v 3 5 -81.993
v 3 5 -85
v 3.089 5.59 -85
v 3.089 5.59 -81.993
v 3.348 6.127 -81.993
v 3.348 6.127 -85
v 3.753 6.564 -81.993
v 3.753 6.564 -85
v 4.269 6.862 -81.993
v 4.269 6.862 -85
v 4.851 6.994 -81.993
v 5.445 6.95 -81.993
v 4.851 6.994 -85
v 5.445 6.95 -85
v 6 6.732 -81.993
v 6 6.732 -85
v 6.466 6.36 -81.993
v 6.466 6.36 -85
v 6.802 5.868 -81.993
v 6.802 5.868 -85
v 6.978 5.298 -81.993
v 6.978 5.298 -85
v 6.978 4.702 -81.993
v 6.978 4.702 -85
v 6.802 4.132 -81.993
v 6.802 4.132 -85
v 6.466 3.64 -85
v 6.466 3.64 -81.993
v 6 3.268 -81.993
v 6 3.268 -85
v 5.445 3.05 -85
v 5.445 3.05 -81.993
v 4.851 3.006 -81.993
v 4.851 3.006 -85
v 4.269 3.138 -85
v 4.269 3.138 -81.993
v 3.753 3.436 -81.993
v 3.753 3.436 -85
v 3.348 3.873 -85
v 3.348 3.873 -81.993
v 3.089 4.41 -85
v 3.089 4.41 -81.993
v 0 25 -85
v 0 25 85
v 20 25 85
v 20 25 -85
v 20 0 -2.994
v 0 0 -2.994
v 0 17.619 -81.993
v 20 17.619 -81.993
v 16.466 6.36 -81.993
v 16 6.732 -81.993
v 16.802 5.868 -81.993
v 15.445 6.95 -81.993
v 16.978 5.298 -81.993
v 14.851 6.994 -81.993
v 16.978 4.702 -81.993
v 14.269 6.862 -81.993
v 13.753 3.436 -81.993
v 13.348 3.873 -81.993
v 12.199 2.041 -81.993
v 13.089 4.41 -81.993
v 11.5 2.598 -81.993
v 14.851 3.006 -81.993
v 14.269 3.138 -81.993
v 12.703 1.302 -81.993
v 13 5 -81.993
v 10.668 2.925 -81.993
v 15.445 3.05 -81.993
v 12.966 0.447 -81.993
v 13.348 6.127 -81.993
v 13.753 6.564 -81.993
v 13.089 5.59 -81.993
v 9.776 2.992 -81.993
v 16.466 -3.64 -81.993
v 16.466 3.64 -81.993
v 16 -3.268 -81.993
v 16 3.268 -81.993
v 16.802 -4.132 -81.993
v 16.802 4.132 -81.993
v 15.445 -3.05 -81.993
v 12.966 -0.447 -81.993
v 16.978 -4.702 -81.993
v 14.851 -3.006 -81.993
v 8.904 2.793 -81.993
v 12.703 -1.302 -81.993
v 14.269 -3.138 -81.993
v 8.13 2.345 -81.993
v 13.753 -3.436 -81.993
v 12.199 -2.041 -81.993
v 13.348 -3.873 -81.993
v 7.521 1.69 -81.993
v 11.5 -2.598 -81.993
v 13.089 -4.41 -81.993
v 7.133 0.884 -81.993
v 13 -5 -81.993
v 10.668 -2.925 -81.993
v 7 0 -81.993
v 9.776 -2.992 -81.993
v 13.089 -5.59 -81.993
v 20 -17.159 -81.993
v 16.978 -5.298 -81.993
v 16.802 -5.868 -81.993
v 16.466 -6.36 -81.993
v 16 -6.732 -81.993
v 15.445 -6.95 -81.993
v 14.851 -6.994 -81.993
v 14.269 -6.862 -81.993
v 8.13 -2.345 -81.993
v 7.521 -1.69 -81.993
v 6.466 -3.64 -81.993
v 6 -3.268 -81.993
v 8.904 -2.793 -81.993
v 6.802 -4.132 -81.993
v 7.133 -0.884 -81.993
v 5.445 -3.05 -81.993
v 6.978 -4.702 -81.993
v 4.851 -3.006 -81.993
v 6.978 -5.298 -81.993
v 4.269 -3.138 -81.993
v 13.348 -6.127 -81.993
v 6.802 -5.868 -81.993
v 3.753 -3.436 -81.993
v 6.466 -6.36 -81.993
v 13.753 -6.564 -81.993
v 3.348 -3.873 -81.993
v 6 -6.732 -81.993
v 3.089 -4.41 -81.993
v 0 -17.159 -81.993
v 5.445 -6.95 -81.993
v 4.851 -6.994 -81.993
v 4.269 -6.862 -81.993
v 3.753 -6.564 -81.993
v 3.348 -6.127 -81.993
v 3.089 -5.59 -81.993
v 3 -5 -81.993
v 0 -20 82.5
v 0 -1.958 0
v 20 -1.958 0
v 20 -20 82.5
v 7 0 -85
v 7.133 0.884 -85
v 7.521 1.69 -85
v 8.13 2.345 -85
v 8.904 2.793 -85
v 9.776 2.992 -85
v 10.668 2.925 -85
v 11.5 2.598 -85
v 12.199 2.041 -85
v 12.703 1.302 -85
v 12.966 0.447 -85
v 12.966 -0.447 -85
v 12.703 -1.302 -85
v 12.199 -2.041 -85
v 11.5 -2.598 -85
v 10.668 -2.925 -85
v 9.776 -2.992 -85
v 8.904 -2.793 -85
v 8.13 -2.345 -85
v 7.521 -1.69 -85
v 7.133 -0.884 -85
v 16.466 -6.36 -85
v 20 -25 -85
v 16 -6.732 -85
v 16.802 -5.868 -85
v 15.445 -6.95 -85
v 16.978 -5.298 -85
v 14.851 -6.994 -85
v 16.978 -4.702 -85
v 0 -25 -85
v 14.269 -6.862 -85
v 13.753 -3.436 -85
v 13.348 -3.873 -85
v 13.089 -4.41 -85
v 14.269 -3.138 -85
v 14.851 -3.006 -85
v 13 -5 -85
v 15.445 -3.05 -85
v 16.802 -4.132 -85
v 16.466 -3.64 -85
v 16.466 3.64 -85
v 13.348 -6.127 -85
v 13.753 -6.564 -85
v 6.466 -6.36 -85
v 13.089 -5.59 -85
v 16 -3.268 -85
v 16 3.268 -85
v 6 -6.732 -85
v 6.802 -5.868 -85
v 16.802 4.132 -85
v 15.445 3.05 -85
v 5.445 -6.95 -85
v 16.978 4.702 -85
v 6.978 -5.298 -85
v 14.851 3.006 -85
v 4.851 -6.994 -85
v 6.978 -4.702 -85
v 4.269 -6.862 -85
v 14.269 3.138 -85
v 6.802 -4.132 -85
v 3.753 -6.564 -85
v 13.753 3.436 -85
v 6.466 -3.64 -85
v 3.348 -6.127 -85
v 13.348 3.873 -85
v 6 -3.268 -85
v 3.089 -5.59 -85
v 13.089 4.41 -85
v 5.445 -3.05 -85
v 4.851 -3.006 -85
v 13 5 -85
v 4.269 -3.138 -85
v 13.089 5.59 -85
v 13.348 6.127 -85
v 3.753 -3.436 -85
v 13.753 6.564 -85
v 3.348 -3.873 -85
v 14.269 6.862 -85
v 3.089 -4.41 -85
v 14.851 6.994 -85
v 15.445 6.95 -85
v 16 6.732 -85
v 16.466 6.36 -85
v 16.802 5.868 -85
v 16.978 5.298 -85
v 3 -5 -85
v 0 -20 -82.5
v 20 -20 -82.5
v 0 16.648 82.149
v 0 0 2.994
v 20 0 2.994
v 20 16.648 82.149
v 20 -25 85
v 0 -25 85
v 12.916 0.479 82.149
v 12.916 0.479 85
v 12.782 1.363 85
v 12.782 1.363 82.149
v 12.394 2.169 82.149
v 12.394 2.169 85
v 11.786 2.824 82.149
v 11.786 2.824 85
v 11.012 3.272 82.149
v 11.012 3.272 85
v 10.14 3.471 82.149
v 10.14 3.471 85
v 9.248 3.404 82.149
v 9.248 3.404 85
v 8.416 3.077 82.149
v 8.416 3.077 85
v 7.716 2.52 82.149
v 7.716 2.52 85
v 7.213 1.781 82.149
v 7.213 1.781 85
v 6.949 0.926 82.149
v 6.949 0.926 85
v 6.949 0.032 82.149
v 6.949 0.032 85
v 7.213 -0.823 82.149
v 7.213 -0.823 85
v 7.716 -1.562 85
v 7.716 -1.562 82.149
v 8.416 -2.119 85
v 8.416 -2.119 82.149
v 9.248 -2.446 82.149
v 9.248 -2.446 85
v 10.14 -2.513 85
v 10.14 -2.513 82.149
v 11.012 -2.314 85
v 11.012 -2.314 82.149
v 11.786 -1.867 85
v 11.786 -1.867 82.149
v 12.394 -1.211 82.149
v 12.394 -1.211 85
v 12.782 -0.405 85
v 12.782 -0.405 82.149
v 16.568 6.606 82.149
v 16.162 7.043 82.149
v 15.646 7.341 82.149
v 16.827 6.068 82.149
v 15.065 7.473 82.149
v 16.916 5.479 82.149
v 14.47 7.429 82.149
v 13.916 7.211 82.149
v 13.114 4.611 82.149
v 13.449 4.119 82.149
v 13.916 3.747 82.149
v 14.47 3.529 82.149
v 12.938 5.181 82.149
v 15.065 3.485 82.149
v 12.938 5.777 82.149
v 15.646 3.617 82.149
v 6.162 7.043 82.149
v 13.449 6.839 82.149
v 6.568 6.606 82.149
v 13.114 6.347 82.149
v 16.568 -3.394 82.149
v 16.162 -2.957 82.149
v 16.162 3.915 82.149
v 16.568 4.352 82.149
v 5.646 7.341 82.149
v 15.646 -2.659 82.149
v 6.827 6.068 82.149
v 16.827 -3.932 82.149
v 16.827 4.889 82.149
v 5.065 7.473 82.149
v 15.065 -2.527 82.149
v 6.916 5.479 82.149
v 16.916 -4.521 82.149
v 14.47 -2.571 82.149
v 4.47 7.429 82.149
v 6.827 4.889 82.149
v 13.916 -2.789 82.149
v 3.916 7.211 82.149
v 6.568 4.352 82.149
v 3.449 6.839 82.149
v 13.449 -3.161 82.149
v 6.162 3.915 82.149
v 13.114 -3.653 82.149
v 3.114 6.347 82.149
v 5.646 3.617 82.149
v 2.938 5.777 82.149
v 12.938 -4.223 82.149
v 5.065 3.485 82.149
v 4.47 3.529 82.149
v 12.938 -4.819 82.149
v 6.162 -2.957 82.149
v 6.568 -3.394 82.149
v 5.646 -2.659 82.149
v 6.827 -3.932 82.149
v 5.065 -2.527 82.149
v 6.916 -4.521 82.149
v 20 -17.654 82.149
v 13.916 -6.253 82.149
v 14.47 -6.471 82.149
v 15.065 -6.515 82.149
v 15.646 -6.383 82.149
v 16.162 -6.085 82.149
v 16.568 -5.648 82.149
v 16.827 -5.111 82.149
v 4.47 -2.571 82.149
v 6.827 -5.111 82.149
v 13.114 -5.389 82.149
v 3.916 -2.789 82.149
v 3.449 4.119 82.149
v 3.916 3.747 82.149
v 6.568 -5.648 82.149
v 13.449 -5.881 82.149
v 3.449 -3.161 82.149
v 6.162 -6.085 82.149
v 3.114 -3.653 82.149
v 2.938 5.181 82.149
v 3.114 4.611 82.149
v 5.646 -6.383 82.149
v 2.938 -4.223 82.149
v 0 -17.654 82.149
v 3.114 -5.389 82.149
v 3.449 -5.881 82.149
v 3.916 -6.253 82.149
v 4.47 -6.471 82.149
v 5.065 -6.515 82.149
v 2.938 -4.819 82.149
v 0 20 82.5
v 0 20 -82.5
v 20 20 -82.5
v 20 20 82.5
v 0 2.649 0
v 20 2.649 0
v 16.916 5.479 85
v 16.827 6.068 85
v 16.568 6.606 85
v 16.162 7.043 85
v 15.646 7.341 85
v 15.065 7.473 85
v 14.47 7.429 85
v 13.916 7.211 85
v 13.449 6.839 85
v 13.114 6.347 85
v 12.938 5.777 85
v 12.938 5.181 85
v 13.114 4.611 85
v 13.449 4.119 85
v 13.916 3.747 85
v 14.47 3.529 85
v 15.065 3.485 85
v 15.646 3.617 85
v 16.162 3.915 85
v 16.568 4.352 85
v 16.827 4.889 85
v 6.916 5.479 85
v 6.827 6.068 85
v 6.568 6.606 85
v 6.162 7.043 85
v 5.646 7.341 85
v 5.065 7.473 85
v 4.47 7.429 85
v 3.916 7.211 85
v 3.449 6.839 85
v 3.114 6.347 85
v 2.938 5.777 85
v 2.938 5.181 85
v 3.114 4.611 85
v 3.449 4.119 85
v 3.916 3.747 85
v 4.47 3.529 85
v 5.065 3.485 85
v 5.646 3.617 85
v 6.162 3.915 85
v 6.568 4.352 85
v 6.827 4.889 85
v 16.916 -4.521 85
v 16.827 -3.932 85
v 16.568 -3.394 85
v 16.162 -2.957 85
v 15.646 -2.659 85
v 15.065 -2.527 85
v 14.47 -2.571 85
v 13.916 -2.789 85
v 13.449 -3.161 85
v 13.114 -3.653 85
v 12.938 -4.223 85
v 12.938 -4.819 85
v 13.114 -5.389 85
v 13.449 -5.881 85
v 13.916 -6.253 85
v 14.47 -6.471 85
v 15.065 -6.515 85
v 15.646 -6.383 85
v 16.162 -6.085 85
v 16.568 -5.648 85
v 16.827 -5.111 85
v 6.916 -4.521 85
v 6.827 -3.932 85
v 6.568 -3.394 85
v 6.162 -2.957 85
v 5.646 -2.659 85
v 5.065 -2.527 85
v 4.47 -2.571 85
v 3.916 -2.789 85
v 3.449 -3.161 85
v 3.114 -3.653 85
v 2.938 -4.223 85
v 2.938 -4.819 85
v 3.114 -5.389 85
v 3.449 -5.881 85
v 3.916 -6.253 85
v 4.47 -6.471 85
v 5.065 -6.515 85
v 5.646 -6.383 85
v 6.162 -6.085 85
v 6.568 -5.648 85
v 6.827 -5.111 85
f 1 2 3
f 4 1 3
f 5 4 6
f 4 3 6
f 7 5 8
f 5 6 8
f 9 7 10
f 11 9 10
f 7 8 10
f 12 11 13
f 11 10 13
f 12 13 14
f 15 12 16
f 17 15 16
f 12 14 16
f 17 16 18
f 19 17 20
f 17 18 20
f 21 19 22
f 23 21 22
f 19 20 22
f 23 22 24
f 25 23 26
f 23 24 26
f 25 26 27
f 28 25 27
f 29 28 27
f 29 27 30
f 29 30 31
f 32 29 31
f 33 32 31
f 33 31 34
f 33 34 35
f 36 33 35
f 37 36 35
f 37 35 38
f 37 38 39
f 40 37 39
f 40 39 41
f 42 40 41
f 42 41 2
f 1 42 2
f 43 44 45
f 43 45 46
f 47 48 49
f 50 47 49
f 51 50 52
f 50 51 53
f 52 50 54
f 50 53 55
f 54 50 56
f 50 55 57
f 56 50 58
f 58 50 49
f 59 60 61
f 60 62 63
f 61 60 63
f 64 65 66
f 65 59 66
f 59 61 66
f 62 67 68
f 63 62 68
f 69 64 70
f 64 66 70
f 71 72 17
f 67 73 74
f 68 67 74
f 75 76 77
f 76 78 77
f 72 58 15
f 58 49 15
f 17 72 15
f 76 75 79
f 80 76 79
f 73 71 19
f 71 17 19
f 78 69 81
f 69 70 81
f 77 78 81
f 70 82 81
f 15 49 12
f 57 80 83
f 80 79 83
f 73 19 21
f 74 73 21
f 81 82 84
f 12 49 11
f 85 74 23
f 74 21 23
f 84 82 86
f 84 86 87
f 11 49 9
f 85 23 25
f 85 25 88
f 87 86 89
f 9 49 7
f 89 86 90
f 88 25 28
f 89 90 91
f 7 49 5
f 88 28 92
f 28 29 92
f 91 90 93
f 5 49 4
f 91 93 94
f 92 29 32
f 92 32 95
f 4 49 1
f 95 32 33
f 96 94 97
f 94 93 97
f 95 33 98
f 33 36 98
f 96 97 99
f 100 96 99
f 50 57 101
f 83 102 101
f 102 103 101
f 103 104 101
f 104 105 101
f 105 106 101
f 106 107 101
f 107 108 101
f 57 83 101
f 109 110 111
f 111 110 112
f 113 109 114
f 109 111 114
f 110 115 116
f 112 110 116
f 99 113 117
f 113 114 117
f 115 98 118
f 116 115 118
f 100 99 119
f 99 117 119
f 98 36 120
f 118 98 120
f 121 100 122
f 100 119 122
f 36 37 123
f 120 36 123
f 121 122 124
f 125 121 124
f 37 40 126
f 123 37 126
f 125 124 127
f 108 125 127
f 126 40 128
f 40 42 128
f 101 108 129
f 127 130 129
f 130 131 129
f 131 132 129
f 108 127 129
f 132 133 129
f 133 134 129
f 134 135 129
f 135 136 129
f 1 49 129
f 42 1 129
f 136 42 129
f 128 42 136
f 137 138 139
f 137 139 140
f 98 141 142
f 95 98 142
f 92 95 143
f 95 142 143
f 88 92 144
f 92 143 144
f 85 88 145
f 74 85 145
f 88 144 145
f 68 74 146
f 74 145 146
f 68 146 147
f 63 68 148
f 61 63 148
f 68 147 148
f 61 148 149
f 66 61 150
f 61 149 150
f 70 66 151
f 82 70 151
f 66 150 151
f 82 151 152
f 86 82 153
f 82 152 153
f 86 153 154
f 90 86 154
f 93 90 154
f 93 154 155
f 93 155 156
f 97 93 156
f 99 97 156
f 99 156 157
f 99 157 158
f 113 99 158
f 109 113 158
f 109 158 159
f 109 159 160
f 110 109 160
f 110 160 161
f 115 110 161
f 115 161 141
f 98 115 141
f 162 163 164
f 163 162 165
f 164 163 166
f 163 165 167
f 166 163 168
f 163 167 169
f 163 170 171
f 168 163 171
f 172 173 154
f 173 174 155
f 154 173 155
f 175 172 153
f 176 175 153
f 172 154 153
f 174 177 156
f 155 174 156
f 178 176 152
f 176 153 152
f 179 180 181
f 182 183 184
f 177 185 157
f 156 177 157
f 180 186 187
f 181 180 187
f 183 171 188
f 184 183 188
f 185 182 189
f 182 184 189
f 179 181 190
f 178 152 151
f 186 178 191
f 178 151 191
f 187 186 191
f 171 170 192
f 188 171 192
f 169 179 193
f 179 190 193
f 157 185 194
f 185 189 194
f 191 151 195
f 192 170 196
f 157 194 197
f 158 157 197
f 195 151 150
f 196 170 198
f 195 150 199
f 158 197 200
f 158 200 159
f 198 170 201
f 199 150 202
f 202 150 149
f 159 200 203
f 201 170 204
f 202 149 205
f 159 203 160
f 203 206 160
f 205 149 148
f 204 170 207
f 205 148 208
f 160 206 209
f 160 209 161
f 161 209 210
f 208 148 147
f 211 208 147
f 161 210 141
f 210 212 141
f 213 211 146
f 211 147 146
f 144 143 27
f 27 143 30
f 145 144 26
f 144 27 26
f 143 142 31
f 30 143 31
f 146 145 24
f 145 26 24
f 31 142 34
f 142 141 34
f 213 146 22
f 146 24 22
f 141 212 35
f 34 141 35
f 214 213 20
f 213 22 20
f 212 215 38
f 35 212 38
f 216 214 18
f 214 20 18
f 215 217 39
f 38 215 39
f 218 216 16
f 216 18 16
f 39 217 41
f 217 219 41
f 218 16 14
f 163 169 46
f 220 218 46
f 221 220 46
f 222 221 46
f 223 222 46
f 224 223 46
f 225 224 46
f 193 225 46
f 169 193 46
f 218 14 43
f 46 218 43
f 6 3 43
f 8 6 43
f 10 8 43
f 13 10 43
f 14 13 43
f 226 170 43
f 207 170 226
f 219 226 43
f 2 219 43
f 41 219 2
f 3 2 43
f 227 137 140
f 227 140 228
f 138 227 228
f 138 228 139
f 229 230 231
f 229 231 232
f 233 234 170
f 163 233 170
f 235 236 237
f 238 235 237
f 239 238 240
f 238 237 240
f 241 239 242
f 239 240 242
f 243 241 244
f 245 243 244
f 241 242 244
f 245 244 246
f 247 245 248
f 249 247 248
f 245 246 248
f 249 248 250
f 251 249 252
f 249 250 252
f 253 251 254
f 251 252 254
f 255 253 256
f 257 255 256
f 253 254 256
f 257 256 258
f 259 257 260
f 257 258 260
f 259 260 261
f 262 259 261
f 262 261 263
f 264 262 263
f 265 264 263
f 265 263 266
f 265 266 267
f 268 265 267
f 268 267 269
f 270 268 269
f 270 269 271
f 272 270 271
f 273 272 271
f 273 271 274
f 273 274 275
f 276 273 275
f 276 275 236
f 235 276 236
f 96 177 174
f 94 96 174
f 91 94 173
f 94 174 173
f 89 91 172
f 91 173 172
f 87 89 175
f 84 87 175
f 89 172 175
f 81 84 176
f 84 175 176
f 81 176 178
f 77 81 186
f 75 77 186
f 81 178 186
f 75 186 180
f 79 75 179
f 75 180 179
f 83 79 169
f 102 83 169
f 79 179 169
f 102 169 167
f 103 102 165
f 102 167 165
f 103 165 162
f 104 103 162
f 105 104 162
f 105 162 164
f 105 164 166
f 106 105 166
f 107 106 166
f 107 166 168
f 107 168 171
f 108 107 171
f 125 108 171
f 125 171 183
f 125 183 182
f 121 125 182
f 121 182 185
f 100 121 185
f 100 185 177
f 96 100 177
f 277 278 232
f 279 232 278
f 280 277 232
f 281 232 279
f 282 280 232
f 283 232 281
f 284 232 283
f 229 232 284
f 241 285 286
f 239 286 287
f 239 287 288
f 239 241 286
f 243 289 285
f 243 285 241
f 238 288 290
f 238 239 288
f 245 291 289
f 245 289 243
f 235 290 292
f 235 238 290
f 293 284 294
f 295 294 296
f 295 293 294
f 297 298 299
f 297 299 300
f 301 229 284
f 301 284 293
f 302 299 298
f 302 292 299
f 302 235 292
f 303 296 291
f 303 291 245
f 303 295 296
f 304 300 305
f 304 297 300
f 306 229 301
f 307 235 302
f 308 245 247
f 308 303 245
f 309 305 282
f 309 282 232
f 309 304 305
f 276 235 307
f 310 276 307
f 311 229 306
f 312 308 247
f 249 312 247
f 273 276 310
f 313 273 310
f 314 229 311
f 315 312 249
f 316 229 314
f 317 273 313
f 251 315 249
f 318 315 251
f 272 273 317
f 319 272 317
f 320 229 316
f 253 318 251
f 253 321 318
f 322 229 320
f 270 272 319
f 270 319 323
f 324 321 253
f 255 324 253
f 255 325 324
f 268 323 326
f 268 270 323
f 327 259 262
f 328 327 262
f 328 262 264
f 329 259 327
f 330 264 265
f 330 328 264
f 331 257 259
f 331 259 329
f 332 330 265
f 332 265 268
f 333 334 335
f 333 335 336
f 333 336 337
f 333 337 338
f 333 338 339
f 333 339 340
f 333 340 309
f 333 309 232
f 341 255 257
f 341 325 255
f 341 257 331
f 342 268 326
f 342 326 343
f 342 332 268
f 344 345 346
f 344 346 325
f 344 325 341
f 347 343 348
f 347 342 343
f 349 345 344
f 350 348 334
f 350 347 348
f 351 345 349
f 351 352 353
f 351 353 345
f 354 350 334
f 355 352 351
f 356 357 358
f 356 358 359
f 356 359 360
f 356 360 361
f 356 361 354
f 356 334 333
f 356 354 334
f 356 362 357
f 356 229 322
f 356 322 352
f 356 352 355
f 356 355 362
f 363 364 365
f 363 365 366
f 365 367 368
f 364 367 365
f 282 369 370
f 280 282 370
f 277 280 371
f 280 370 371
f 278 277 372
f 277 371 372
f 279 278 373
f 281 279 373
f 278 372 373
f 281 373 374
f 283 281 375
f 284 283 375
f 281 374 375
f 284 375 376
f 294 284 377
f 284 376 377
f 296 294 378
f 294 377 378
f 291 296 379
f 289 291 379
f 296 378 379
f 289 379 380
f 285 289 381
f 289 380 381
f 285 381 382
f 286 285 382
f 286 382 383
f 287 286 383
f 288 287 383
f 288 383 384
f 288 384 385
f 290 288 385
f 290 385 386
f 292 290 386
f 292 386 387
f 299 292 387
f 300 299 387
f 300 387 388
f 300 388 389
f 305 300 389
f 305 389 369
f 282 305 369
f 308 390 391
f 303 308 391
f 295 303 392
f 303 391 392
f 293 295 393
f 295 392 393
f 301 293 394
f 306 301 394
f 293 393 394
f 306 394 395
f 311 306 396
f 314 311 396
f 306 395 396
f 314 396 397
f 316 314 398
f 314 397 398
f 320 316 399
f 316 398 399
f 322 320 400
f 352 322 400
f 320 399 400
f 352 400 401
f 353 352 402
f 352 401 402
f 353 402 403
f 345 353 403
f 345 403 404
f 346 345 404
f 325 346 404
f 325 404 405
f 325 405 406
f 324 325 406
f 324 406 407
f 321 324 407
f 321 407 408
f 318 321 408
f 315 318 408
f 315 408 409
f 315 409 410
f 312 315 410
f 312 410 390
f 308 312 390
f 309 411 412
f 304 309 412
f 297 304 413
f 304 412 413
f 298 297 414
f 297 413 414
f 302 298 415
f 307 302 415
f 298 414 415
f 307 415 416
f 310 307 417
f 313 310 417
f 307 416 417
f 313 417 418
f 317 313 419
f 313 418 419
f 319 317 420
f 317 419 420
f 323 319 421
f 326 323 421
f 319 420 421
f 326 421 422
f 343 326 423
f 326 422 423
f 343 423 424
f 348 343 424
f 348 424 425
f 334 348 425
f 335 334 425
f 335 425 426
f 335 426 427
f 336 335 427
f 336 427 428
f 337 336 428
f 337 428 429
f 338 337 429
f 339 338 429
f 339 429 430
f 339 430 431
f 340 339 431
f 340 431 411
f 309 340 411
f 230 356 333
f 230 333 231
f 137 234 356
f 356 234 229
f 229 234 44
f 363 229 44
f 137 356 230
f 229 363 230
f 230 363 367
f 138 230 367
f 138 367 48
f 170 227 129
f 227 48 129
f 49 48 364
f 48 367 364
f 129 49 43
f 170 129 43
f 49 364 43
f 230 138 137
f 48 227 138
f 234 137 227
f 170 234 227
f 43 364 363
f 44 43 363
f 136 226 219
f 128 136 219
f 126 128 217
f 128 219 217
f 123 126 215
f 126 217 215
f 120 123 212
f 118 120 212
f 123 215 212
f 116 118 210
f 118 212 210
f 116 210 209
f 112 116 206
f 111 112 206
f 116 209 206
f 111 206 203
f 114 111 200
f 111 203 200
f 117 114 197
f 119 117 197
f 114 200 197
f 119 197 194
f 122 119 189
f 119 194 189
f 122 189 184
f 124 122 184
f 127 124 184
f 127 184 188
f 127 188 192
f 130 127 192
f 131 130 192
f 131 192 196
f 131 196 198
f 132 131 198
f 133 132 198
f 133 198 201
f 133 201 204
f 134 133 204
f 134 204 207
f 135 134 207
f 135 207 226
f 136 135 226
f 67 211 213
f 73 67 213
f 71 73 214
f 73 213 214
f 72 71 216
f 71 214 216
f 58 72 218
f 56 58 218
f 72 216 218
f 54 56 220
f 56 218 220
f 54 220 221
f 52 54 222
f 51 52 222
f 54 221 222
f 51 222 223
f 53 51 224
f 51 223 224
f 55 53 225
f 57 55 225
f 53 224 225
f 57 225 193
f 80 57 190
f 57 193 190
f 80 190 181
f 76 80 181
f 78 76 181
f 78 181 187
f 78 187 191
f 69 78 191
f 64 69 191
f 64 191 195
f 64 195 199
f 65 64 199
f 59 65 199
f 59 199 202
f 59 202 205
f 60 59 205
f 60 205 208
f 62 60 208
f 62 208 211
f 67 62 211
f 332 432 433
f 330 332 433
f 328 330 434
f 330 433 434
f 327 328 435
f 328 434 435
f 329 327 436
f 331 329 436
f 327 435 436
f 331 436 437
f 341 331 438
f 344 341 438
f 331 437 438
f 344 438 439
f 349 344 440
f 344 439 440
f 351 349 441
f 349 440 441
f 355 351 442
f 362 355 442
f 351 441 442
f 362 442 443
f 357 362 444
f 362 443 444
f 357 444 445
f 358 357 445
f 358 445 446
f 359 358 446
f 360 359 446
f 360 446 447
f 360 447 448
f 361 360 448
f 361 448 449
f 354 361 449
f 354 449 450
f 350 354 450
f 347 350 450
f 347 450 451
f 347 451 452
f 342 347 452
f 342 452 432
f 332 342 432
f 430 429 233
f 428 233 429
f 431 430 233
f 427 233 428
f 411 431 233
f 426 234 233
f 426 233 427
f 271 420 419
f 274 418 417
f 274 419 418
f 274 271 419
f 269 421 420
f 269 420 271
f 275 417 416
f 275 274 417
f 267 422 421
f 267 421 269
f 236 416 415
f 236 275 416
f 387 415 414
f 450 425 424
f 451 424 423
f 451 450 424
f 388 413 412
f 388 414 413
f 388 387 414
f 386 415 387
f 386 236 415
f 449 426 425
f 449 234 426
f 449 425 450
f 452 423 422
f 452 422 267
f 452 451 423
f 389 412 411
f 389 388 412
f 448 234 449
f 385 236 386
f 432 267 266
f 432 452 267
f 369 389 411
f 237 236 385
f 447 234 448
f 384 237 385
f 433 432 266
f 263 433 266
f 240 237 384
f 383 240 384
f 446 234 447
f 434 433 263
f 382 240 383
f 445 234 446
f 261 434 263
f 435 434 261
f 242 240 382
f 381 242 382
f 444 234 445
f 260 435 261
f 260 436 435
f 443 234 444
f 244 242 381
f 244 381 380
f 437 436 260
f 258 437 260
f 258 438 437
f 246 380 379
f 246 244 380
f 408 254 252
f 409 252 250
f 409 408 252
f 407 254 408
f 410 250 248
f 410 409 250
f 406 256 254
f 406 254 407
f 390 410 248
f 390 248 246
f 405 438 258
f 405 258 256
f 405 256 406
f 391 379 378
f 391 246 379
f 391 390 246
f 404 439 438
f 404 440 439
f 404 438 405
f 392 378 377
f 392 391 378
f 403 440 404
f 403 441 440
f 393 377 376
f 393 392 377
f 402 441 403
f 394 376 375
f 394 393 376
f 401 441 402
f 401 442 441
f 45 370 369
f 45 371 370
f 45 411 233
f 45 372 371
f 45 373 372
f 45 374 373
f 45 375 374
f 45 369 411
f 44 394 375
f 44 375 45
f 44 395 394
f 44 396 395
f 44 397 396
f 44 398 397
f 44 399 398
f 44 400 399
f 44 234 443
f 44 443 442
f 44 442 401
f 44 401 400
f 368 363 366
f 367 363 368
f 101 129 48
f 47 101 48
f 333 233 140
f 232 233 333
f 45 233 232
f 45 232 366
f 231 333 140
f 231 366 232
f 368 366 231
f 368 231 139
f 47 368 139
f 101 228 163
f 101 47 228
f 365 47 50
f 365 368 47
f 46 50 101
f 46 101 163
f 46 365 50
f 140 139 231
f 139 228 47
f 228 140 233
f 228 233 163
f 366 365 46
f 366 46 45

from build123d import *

# Parameters (mm, degrees)
SKETCH4_W           = 170
SKETCH4_H           = 50
BOSS_EXTRUDE1_DEPTH = 20
CUT_EXTRUDE5_DEPTH  = 20
CUT_EXTRUDE6_DEPTH  = 20
SKETCH7_R           = 3
SKETCH7_R_2         = 2
CUT_EXTRUDE7_DEPTH  = 5
SKETCH8_R           = 3
SKETCH8_R_2         = 2
CUT_EXTRUDE8_DEPTH  = 5


with BuildPart() as part:
    # Sketch4 → Boss-Extrude1 (new body)
    with BuildSketch(Plane(origin=(0, 0, 0), x_dir=(0, 0, -1), z_dir=(1, 0, 0))):
        Rectangle(SKETCH4_W, SKETCH4_H)
    extrude(amount=BOSS_EXTRUDE1_DEPTH)

    # Sketch5 → Cut-Extrude5 (cut)
    with BuildSketch(Plane.ZY):
        Polygon((-82.5, 20), (82.5, 20), (0, 2.648640731), align=None)
        Polygon((0, -1.957690975), (82.5, -20), (-82.5, -20), align=None)
    extrude(amount=-CUT_EXTRUDE5_DEPTH, mode=Mode.SUBTRACT)

    # Sketch6 → Cut-Extrude6 (cut)
    with BuildSketch(Plane.ZY):
        Polygon((-2.994115609, 0), (-81.99270438, 17.619218778), (-81.99270438, -17.158585608), align=None)
        Polygon((2.994115609, 0), (82.148587467, 16.647729441), (82.148587467, -17.653985706), align=None)
    extrude(amount=-CUT_EXTRUDE6_DEPTH, mode=Mode.SUBTRACT)

    # Sketch7 → Cut-Extrude7 (cut)
    with BuildSketch(Plane.XY.offset(85)):
        with Locations((9.915502372, 0.478984513)):
            Circle(SKETCH7_R)
        with Locations((4.915502372, -4.521015487)):
            Circle(SKETCH7_R_2)
        with Locations((14.915502372, -4.521015487)):
            Circle(SKETCH7_R_2)
        with Locations((14.915502372, 5.478984513)):
            Circle(SKETCH7_R_2)
        with Locations((4.915502372, 5.478984513)):
            Circle(SKETCH7_R_2)
    extrude(amount=-CUT_EXTRUDE7_DEPTH, mode=Mode.SUBTRACT)

    # Sketch8 → Cut-Extrude8 (cut)
    with BuildSketch(Plane(origin=(0, 0, -85), x_dir=(-1, 0, 0), z_dir=(0, 0, -1))):
        with Locations((-10, 0)):
            Circle(SKETCH8_R)
        with Locations((-15, 5)):
            Circle(SKETCH8_R_2)
        with Locations((-5, 5)):
            Circle(SKETCH8_R_2)
        with Locations((-5, -5)):
            Circle(SKETCH8_R_2)
        with Locations((-15, -5)):
            Circle(SKETCH8_R_2)
    extrude(amount=-CUT_EXTRUDE8_DEPTH, mode=Mode.SUBTRACT)


solid = part.part
